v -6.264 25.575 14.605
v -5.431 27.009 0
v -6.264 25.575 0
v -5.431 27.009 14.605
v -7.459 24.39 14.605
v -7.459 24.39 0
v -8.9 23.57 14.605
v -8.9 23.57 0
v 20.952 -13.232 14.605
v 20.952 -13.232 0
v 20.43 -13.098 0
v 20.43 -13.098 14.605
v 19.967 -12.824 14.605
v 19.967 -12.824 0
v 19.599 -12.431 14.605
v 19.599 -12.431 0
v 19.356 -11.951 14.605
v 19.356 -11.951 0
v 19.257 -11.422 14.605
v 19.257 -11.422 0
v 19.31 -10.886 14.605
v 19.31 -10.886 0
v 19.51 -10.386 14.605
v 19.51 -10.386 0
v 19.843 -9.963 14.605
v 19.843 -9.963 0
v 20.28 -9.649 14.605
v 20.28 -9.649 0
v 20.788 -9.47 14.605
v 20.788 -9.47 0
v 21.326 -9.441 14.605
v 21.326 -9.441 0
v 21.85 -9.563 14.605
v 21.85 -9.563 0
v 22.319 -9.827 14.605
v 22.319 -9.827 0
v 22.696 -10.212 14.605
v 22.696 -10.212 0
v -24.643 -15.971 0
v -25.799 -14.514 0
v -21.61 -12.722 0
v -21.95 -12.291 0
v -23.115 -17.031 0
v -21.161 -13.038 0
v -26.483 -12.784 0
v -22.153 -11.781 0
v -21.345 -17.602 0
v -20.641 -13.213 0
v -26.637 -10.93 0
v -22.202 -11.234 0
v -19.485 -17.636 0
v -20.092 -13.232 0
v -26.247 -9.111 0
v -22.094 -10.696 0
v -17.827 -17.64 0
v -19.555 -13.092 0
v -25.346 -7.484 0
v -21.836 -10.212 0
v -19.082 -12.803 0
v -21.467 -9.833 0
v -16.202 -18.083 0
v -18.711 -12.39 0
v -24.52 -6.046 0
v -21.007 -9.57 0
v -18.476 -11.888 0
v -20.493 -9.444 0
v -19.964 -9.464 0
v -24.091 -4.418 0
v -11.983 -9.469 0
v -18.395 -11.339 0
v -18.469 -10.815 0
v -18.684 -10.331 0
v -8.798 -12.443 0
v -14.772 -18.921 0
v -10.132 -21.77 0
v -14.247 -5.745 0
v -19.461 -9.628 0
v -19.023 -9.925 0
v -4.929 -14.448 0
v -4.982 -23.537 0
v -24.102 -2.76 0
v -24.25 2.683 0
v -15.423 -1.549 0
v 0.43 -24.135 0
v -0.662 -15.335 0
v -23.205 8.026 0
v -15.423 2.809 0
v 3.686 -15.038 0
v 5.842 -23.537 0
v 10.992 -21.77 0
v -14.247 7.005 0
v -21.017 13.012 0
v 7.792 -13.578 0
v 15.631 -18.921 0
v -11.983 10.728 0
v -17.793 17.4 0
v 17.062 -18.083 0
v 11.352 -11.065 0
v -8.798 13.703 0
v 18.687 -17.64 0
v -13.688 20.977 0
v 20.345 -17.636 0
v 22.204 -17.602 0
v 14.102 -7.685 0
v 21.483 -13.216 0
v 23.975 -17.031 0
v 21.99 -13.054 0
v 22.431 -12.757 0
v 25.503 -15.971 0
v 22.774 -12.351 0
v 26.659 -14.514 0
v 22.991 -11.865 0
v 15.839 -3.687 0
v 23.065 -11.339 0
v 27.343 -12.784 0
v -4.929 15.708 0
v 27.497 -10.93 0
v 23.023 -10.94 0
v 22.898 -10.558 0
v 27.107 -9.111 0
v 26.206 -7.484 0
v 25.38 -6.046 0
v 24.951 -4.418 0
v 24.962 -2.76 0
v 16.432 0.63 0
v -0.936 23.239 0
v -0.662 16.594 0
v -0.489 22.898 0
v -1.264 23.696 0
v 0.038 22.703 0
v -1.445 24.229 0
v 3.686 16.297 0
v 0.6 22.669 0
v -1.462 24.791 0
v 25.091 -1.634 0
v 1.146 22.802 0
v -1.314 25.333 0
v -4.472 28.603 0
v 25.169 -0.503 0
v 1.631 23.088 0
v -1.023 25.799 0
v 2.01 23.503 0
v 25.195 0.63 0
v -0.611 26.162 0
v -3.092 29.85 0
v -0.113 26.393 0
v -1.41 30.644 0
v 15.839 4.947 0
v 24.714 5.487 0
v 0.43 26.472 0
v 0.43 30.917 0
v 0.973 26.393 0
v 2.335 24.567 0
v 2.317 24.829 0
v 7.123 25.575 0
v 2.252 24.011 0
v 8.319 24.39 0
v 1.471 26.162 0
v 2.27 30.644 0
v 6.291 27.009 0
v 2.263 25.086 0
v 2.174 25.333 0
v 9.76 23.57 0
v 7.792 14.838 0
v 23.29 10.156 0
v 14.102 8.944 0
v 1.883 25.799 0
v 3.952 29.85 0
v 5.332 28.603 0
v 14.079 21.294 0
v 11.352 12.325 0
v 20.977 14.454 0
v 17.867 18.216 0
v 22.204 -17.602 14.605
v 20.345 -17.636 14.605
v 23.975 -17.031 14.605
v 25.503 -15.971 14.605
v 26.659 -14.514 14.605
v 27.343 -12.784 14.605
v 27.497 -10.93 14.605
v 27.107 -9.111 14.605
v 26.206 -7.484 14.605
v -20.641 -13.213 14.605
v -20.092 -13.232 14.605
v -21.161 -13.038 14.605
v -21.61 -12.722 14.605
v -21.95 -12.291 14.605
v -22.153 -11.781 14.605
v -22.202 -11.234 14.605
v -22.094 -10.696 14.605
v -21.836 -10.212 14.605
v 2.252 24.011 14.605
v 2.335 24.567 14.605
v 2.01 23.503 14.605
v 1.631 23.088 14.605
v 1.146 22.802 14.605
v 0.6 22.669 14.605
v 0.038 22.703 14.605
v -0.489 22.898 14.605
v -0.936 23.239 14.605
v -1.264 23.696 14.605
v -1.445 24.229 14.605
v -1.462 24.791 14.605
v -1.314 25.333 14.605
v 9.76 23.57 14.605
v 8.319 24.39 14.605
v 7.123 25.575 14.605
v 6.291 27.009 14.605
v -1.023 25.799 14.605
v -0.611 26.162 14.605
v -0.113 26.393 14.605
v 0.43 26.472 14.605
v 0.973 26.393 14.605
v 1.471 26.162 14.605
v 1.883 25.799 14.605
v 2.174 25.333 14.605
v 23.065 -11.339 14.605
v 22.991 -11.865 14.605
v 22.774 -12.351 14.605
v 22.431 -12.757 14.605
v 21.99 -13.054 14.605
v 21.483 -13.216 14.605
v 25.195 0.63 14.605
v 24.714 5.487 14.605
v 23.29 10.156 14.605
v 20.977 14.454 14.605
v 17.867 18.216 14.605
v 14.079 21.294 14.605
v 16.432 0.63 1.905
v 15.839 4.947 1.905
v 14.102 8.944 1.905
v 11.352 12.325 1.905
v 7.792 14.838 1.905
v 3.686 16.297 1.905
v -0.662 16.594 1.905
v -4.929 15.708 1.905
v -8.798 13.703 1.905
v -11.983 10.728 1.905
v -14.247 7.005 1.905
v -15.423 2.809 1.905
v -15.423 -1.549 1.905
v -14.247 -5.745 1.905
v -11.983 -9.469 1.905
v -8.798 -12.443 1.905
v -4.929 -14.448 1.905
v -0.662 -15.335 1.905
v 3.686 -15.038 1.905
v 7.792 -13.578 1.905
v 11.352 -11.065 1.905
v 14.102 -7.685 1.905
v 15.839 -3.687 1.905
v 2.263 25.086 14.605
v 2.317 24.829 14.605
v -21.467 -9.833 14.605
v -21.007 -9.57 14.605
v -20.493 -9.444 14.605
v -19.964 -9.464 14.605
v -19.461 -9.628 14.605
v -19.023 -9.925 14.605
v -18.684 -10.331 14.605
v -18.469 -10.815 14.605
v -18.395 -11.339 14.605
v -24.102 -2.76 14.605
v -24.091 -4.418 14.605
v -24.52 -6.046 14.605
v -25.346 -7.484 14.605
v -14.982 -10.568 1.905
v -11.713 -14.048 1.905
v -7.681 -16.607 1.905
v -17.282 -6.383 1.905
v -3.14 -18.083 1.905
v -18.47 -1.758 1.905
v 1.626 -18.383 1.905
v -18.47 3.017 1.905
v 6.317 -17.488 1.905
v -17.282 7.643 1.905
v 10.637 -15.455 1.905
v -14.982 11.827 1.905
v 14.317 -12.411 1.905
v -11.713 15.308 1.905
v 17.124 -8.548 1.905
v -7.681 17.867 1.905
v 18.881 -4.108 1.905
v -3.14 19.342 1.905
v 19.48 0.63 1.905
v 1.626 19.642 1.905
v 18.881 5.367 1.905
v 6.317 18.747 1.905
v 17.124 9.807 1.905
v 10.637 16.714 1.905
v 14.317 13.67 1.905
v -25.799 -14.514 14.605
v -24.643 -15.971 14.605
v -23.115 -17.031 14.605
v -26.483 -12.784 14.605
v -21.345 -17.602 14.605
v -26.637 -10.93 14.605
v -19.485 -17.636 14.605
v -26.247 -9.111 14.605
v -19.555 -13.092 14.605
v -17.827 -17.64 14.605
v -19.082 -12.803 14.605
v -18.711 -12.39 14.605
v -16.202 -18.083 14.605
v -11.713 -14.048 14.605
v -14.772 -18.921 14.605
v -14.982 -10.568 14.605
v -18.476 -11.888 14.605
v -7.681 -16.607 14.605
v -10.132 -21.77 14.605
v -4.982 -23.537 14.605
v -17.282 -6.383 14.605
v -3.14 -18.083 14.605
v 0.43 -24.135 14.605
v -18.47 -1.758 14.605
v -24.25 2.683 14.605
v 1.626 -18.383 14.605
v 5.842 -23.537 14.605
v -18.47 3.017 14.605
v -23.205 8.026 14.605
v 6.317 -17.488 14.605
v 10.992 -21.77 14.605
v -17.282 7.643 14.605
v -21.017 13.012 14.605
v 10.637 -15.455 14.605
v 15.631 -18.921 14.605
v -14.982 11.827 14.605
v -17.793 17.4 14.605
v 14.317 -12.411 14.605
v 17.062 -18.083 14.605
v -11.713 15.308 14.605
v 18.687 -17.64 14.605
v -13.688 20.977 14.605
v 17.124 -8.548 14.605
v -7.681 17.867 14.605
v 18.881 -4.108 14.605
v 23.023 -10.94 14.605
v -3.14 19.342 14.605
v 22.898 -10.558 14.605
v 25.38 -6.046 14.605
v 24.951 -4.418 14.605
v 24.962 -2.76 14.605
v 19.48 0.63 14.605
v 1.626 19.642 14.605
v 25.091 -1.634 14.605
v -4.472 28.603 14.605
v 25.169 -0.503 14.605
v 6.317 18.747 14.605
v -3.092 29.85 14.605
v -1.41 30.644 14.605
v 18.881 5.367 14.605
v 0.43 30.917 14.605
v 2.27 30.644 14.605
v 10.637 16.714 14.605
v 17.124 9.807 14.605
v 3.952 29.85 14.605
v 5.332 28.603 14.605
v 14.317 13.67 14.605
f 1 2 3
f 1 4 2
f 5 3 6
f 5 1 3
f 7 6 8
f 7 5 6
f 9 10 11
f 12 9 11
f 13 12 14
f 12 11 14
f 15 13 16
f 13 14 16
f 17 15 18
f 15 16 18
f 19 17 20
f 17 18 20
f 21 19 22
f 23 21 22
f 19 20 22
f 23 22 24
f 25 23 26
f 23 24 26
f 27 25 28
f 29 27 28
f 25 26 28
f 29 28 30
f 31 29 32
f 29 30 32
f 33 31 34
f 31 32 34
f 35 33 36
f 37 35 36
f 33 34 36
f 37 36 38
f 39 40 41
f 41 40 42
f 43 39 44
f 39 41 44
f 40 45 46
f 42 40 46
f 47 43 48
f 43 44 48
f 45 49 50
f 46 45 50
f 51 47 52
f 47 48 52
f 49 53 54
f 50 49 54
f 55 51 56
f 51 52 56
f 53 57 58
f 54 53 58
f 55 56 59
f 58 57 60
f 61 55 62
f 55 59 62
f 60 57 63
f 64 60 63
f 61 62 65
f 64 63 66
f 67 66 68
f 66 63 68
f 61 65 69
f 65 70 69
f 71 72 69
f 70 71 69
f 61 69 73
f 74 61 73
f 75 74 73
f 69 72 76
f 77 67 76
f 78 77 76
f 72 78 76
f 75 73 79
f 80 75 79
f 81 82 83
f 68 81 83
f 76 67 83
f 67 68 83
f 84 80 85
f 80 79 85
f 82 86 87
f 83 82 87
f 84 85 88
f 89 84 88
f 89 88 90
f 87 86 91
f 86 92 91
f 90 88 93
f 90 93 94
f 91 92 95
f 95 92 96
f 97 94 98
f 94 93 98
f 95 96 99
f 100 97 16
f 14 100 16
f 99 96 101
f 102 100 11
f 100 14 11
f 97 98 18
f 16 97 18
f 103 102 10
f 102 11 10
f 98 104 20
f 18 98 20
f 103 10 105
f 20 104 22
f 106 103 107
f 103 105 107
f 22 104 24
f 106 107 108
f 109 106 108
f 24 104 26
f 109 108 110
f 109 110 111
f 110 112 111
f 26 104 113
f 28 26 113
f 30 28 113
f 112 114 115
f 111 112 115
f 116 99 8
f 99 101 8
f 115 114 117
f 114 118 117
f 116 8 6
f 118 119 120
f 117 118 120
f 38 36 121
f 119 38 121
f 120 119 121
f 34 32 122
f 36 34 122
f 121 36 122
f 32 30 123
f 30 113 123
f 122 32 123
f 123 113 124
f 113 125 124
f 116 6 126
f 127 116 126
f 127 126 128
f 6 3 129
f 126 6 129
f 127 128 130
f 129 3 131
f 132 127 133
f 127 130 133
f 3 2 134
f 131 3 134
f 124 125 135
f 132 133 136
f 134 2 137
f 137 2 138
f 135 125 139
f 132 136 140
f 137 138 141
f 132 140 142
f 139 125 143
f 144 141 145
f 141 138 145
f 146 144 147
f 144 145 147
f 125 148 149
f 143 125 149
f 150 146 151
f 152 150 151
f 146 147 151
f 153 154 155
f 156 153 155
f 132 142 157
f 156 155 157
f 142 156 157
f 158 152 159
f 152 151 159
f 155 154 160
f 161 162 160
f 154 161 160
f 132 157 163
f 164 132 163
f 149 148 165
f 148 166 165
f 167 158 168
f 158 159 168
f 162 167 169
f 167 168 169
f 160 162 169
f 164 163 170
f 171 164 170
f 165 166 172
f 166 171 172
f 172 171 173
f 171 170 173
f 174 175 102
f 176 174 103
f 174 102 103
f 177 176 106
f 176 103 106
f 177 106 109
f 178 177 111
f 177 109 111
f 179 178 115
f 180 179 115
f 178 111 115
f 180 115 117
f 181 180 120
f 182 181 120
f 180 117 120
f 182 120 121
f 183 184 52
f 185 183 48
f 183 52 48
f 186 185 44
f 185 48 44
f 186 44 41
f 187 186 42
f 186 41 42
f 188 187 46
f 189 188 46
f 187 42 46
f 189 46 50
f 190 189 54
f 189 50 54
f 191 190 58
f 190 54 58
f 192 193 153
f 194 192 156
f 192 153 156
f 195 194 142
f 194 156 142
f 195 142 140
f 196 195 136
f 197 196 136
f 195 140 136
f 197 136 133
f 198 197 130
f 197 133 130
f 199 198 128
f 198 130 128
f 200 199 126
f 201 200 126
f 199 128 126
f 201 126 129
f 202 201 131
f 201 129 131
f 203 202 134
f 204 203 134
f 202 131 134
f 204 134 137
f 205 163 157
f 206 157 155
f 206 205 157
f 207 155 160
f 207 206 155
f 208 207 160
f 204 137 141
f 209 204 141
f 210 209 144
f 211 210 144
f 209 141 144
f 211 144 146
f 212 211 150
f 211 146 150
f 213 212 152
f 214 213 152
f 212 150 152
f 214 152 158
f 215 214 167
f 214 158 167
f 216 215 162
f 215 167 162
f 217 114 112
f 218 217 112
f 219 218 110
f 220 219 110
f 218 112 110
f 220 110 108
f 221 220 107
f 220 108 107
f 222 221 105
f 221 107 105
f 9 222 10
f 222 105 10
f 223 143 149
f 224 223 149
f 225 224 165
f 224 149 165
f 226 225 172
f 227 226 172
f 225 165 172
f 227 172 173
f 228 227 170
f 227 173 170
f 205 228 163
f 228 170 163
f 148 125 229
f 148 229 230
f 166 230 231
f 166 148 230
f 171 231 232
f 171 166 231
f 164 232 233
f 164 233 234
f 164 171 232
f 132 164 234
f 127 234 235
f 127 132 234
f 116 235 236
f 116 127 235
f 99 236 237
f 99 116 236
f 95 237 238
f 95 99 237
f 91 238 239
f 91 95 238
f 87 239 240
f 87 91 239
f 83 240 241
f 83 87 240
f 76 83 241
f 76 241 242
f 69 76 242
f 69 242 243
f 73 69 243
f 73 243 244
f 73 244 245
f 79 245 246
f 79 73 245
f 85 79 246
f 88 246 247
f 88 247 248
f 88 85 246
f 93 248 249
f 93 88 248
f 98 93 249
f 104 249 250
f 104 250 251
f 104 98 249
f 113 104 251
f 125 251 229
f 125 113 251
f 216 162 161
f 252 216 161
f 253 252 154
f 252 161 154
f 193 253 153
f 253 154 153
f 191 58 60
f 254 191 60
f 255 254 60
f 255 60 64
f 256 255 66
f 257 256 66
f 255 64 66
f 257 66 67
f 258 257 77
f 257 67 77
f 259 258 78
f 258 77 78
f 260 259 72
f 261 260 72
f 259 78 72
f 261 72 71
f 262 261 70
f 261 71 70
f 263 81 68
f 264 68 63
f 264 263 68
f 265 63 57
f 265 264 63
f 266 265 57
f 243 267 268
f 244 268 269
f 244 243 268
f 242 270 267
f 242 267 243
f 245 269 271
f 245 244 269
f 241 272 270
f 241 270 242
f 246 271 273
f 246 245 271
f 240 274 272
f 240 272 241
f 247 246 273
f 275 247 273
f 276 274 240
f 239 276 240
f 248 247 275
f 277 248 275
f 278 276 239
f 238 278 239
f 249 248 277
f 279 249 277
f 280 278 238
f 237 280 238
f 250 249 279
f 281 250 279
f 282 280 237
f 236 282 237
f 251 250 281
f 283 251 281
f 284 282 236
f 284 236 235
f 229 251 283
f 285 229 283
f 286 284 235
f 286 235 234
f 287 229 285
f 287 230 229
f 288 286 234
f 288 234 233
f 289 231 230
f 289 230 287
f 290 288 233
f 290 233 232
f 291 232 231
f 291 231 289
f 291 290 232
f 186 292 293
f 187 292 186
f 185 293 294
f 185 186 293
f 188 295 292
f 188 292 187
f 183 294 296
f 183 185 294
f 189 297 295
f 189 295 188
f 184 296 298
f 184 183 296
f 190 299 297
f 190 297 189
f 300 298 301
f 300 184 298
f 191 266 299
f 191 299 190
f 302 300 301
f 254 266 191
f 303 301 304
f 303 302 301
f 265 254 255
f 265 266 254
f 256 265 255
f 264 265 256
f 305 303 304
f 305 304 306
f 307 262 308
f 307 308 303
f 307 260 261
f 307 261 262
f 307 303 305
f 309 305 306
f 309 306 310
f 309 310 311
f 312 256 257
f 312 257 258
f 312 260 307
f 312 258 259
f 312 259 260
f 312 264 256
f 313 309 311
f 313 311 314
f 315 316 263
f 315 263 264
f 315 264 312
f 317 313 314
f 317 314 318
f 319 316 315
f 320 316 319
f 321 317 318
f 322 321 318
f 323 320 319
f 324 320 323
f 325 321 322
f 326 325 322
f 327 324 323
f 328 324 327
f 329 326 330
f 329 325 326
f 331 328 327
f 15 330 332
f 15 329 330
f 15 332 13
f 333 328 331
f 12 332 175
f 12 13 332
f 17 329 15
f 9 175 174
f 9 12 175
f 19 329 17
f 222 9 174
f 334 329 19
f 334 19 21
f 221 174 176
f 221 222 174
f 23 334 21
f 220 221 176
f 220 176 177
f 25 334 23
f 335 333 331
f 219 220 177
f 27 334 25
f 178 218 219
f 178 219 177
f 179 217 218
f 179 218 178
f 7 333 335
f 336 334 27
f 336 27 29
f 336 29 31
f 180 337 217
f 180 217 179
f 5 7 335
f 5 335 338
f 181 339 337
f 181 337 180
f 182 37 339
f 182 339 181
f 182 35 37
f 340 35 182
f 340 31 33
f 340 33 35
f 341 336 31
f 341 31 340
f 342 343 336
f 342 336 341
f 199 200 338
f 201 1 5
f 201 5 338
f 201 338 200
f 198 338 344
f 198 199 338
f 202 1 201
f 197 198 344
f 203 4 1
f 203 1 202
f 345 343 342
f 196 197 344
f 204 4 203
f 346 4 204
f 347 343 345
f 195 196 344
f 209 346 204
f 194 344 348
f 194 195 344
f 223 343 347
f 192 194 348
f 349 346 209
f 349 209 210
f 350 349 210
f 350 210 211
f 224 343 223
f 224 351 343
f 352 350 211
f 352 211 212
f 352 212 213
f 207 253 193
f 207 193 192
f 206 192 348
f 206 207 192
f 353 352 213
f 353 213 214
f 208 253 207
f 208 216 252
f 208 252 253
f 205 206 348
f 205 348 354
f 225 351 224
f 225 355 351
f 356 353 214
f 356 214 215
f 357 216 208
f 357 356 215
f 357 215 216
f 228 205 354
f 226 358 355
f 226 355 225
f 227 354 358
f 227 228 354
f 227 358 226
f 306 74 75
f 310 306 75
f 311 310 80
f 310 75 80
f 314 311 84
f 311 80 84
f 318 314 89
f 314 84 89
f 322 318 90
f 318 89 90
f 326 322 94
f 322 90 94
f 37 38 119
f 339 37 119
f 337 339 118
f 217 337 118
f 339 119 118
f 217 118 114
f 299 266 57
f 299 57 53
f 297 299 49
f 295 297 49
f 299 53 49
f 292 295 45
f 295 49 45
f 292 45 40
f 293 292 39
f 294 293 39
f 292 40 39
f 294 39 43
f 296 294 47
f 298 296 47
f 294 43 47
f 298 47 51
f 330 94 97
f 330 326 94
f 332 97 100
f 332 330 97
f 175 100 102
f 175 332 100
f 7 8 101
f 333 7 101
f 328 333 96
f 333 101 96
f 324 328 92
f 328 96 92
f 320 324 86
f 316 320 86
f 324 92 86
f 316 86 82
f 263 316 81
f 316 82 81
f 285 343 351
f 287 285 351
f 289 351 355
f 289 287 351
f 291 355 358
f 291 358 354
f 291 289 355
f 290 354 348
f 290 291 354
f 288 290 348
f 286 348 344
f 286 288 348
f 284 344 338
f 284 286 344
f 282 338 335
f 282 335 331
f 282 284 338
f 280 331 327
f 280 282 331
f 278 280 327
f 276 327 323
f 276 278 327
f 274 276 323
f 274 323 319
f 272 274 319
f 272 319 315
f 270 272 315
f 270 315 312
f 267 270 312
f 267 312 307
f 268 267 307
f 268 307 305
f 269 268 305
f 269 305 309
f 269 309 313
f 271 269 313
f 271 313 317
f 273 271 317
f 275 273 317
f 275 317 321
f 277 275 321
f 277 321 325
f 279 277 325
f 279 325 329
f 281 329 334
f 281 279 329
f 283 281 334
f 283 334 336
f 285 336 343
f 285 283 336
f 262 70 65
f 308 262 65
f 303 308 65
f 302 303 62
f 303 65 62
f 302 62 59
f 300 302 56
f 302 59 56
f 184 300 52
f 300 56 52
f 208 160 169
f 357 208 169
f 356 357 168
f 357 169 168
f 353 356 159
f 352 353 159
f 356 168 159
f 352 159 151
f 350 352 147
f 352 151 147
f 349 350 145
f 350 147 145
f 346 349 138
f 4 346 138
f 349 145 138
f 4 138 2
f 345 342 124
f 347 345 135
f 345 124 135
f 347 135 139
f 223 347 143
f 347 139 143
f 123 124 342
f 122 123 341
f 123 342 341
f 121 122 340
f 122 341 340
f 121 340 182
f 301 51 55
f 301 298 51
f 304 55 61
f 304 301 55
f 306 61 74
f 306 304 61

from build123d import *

# Parameters (mm, degrees)
F0_R     = 19.05
F1_DEPTH = 14.605
F0_R_2   = 16.002
F2_DEPTH = 1.905
F3_R     = 6.35


with BuildPart() as f1:
    # F0 (on Top) → F1 (new body)
    with BuildSketch(Plane.XY):
        with BuildLine():
            ThreePointArc((24.3350653445, -5.8394751301), (24.9790491411, -2.63329093), (25.194965399, 0.6297923397))
            ThreePointArc((25.194965399, 0.6297923397), (20.0585539244, 15.730247217), (6.779965399, 24.5668499075))
            ThreePointArc((6.779965399, 24.5668499075), (4.4950742876, 25.0588757184), (2.1739745412, 25.3333074158))
            ThreePointArc((2.1739745412, 25.3333074158), (2.2942832925, 24.958441266), (2.334965399, 24.5668499075))
            ThreePointArc((2.334965399, 24.5668499075), (0.0383740404, 22.702532014), (-1.3140437432, 25.3333074158))
            ThreePointArc((-1.3140437432, 25.3333074158), (-3.6351434896, 25.0588757184), (-5.920034601, 24.5668499075))
            ThreePointArc((-5.920034601, 24.5668499075), (-21.0171537257, 13.0122923397), (-23.4751345465, -5.8394751301))
            ThreePointArc((-23.4751345465, -5.8394751301), (-22.7587958424, -8.0642617829), (-21.8359107907, -10.2116089767))
            ThreePointArc((-21.8359107907, -10.2116089767), (-19.7071036642, -9.5283941084), (-18.3951345465, -11.3387364441))
            ThreePointArc((-18.3951345465, -11.3387364441), (-18.8813835693, -12.6100234553), (-20.0919016485, -13.2323214198))
            ThreePointArc((-20.0919016485, -13.2323214198), (-18.6936869538, -15.1052369163), (-17.1251345465, -16.8379977581))
            ThreePointArc((-17.1251345465, -16.8379977581), (0.429965399, -24.1352076603), (17.9850653445, -16.8379977581))
            ThreePointArc((17.9850653445, -16.8379977581), (19.5536177518, -15.1052369163), (20.9518324465, -13.2323214198))
            ThreePointArc((20.9518324465, -13.2323214198), (19.5102869503, -10.3862364441), (22.6958415887, -10.2116089767))
            ThreePointArc((22.6958415887, -10.2116089767), (23.6187266404, -8.0642617829), (24.3350653445, -5.8394751301))
        make_face()
        with Locations((0.429965399, 0.6297923397)):
            Circle(F0_R, mode=Mode.SUBTRACT)
        with BuildLine():
            ThreePointArc((-21.8359107907, -10.2116089767), (-22.7587958424, -8.0642617829), (-23.4751345465, -5.8394751301))
            ThreePointArc((-23.4751345465, -5.8394751301), (-25.7993958605, -14.5137364441), (-17.1251345465, -16.8379977581))
            ThreePointArc((-17.1251345465, -16.8379977581), (-18.6936869538, -15.1052369163), (-20.0919016485, -13.2323214198))
            ThreePointArc((-20.0919016485, -13.2323214198), (-21.9499129407, -12.2912364441), (-21.8359107907, -10.2116089767))
        make_face()
        with BuildLine():
            ThreePointArc((17.9850653445, -16.8379977581), (26.6593266585, -14.5137364441), (24.3350653445, -5.8394751301))
            ThreePointArc((24.3350653445, -5.8394751301), (23.6187266404, -8.0642617829), (22.6958415887, -10.2116089767))
            ThreePointArc((22.6958415887, -10.2116089767), (22.9704076802, -10.7457055618), (23.0650653445, -11.3387364441))
            ThreePointArc((23.0650653445, -11.3387364441), (22.4313523556, -12.7574874213), (20.9518324465, -13.2323214198))
            ThreePointArc((20.9518324465, -13.2323214198), (19.5536177518, -15.1052369163), (17.9850653445, -16.8379977581))
        make_face()
        with BuildLine():
            ThreePointArc((2.1739745412, 25.3333074158), (4.4950742876, 25.0588757184), (6.779965399, 24.5668499075))
            ThreePointArc((6.779965399, 24.5668499075), (0.429965399, 30.9168499075), (-5.920034601, 24.5668499075))
            ThreePointArc((-5.920034601, 24.5668499075), (-3.6351434896, 25.0588757184), (-1.3140437432, 25.3333074158))
            ThreePointArc((-1.3140437432, 25.3333074158), (0.429965399, 26.4718499075), (2.1739745412, 25.3333074158))
        make_face()
    extrude(amount=F1_DEPTH)

    # F0 (on Top) → F2 (join)
    with BuildSketch(Plane.XY):
        with Locations((0.429965399, 0.6297923397)):
            Circle(F0_R)
        with Locations((0.429965399, 0.6297923397)):
            Circle(F0_R_2, mode=Mode.SUBTRACT)
    extrude(amount=F2_DEPTH)

    # F3
    f3_edges = [f1.edges().sort_by_distance(p)[0] for p in [
        (17.985065, -16.837998, 7.3025),
        (-23.475135, -5.839475, 7.3025),
        (6.779965, 24.56685, 7.3025),
        (24.335065, -5.839475, 7.3025),
        (-5.920035, 24.56685, 7.3025),
        (-17.125135, -16.837998, 7.3025),
    ]]
    fillet(f3_edges, radius=F3_R)


solid = f1.part
